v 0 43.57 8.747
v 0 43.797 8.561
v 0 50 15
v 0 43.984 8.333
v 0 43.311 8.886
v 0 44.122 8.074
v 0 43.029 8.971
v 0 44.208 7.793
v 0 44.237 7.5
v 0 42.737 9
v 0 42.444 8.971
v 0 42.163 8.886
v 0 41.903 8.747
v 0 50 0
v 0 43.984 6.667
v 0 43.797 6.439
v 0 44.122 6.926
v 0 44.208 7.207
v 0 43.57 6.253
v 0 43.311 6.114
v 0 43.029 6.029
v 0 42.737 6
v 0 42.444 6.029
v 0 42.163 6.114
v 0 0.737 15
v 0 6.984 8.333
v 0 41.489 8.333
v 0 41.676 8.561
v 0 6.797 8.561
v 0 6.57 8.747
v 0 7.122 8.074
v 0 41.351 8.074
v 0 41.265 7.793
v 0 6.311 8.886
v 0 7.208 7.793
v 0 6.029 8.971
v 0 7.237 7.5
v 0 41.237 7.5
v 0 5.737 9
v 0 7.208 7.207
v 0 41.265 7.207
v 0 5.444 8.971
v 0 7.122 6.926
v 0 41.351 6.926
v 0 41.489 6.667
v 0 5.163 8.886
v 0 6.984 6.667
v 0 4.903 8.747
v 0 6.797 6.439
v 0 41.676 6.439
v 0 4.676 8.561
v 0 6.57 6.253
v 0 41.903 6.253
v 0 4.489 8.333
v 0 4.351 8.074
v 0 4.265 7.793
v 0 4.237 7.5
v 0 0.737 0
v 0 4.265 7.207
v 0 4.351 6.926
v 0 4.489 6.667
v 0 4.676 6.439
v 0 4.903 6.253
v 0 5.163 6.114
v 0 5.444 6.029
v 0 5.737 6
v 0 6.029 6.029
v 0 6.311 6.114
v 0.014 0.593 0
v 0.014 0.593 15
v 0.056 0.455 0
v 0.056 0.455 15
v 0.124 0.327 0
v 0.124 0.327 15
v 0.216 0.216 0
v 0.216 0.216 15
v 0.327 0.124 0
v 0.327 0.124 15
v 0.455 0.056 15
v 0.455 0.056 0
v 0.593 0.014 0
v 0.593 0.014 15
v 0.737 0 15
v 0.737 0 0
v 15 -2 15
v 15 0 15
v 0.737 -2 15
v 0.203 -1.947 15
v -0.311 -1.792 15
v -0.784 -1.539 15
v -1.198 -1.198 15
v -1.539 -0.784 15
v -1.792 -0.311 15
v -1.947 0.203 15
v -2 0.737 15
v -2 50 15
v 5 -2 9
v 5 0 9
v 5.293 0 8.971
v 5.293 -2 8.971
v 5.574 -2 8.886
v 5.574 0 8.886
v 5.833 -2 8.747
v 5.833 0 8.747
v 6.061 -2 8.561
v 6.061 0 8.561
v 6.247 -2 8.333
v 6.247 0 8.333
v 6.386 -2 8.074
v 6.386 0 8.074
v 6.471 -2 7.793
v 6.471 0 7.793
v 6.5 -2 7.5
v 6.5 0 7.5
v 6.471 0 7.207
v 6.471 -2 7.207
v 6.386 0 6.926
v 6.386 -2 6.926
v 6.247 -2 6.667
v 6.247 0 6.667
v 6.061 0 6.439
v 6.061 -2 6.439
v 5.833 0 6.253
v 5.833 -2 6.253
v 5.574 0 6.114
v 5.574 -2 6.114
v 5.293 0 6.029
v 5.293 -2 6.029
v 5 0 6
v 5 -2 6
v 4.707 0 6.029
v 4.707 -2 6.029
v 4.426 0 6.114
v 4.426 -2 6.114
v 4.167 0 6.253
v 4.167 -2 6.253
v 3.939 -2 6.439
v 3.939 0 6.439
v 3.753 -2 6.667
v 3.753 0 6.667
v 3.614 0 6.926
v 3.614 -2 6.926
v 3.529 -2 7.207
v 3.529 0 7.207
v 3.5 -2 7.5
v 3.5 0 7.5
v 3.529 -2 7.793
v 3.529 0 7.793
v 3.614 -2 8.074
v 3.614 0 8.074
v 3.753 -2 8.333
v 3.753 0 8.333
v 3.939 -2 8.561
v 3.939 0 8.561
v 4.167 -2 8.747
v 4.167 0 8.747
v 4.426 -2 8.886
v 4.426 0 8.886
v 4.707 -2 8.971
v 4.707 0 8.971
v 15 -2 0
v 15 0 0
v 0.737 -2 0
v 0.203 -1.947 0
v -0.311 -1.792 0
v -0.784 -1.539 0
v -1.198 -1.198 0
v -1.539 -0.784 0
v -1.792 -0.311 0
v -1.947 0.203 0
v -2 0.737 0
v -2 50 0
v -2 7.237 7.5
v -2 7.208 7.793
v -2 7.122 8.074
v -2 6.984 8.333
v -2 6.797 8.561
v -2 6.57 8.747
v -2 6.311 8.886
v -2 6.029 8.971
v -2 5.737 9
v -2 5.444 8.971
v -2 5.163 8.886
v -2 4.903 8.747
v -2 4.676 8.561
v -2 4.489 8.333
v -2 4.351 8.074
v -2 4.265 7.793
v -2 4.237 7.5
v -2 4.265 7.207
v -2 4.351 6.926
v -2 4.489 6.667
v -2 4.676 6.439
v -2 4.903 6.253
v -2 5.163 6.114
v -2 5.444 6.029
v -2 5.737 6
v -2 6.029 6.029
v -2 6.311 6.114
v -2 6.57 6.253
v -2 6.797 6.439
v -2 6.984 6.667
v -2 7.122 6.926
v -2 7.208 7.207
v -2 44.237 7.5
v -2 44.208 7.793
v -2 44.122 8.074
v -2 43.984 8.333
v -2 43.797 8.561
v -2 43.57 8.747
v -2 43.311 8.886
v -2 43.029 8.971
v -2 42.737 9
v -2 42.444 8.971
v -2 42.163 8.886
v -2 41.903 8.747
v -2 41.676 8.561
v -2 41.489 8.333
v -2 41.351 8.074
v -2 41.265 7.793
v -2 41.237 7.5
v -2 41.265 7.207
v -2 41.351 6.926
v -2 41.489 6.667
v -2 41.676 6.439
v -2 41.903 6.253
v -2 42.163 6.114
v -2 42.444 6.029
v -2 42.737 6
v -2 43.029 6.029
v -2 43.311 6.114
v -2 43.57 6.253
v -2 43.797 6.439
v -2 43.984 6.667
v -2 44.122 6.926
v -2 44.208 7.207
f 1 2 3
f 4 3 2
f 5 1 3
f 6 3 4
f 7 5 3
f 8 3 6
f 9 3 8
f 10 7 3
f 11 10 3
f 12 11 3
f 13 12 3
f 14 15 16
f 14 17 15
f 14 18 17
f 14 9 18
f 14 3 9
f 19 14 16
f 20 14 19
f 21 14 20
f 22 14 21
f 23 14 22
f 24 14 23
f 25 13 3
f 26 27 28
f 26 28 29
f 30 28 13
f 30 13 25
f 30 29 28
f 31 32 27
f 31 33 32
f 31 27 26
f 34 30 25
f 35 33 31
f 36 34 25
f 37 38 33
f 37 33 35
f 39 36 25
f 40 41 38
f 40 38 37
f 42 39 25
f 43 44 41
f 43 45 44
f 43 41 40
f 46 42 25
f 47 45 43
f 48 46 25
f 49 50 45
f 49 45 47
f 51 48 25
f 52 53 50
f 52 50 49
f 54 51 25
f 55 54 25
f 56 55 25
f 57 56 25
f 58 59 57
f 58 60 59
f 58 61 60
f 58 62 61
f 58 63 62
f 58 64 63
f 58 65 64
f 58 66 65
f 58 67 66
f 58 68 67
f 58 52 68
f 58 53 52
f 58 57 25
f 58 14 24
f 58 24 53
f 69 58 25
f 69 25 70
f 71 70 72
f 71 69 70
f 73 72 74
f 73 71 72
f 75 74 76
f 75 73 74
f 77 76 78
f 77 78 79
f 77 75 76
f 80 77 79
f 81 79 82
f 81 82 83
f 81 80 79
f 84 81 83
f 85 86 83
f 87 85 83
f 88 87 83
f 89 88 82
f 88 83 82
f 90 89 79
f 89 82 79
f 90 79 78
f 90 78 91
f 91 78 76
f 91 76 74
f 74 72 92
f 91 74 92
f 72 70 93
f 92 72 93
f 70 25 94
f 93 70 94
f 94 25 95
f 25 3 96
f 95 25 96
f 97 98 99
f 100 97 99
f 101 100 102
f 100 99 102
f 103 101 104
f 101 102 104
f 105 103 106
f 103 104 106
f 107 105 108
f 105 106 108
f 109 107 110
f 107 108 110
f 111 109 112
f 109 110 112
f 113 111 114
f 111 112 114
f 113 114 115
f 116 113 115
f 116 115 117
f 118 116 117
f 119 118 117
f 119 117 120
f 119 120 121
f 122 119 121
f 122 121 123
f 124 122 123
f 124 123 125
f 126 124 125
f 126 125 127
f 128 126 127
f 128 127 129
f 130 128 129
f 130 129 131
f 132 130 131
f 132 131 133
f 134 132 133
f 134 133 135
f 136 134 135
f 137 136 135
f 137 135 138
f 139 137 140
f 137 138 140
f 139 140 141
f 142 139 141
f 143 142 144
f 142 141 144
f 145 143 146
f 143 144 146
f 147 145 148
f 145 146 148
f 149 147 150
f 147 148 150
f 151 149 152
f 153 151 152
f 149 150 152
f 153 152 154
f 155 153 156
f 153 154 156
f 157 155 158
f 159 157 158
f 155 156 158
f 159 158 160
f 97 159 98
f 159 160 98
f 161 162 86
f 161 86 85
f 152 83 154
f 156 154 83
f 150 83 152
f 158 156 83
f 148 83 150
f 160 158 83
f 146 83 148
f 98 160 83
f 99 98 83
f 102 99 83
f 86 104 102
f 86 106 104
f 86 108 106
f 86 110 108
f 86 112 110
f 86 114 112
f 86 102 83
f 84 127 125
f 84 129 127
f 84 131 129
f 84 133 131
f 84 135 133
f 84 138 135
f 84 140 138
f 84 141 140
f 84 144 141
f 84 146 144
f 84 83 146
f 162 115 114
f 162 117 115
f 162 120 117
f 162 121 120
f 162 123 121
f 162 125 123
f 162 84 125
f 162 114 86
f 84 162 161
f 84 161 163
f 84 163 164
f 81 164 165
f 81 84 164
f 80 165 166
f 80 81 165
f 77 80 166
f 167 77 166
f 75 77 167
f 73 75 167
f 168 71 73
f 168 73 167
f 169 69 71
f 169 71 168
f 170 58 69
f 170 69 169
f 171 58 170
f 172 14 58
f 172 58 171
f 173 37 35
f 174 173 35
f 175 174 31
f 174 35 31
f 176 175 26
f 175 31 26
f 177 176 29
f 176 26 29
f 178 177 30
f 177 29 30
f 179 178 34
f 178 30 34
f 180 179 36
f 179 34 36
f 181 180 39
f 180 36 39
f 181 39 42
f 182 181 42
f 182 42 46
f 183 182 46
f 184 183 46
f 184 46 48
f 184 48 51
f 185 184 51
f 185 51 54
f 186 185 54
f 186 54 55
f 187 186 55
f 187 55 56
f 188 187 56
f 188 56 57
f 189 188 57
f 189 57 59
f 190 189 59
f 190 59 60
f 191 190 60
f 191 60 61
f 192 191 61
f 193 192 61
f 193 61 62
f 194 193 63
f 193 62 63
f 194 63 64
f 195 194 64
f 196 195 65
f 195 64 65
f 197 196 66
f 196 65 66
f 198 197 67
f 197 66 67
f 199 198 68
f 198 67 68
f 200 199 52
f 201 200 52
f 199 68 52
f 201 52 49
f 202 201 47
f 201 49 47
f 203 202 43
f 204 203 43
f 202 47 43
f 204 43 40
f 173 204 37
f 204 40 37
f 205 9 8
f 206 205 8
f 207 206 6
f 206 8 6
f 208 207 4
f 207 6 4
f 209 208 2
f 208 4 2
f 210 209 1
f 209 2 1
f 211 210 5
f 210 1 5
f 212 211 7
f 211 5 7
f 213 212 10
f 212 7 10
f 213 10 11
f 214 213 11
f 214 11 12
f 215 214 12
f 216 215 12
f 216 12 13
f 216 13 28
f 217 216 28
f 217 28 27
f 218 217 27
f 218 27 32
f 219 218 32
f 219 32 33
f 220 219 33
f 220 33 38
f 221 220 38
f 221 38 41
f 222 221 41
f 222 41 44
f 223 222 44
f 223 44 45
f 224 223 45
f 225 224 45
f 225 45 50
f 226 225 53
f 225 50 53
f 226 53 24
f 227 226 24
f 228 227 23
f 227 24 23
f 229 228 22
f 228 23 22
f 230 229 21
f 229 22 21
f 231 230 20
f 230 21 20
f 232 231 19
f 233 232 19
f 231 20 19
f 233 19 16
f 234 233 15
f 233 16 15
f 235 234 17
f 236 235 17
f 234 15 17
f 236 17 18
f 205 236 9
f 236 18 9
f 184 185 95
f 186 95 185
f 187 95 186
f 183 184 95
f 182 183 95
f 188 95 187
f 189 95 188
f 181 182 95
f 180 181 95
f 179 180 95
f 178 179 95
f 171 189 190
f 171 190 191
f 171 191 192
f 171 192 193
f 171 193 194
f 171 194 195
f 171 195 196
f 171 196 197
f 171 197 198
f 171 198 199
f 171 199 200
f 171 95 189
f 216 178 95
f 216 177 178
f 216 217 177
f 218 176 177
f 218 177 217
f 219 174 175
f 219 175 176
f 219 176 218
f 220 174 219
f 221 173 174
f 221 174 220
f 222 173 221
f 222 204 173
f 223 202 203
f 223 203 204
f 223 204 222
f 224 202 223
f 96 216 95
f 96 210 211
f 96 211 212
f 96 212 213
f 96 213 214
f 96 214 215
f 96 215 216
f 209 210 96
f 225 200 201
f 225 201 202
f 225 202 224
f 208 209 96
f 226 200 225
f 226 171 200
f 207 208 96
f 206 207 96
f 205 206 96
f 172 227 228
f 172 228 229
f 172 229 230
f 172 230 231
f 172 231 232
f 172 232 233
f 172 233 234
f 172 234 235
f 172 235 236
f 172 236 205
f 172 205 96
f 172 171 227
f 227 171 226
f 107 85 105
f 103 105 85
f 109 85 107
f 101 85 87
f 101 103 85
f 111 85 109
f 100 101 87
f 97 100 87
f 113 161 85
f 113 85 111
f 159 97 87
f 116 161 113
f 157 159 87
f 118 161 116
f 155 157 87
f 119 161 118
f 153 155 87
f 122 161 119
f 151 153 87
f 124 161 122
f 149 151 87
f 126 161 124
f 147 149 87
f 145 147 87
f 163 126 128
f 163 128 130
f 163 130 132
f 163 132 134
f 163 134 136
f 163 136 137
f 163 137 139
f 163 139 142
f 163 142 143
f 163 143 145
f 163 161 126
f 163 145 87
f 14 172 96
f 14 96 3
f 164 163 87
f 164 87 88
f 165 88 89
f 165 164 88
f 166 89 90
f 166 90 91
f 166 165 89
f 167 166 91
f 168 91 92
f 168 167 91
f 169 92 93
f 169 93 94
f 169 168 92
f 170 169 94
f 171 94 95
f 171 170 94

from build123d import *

# Parameters (mm, degrees)
SM_BASE_FLANGE_1_DEPTH = 15
SKETCH_6_R             = 1.5
CUT_EXTRUDE_1_DEPTH    = 55.313902456
SKETCH_7_R             = 1.5
CUT_EXTRUDE_2_DEPTH    = 55.313902456


# Sheet-metal steps are written as plain solids
with BuildPart() as part:
    # Sketch 1 → 基体-法兰1 (new body)
    with BuildSketch(Plane.XY):
        with BuildLine():
            Line((0, 50), (0, 0.7366))
            ThreePointArc((0, 0.7366), (0.215745145, 0.215745145), (0.7366, 0))
            Line((0.7366, 0), (15, 0))
            Line((15, 0), (15, -2))
            Line((15, -2), (0.7366, -2))
            ThreePointArc((0.7366, -2), (-1.198468417, -1.198468417), (-2, 0.7366))
            Line((-2, 0.7366), (-2, 50))
            Line((-2, 50), (0, 50))
        make_face()
    extrude(amount=SM_BASE_FLANGE_1_DEPTH)

    # 草图6 → 切除-拉伸1 (cut, through all)
    with BuildSketch(Plane(origin=(0, 0, 0), x_dir=(1, 0, 0), z_dir=(0, 1, 0))):
        with Locations(Location((5, -7.5, 0), (0, 0, 270))):
            Circle(SKETCH_6_R)
    extrude(amount=-CUT_EXTRUDE_1_DEPTH, mode=Mode.SUBTRACT)

    # 草图7 → 切除-拉伸2 (cut, through all)
    with BuildSketch(Plane(origin=(0, 0, 0), x_dir=(0, 0, -1), z_dir=(1, 0, 0))):
        with Locations(Location((-7.5, 42.7366, 0), (0, 0, 90))):
            Circle(SKETCH_7_R)
        with Locations(Location((-7.5, 5.7366, 0), (0, 0, 90))):
            Circle(SKETCH_7_R)
    extrude(amount=-CUT_EXTRUDE_2_DEPTH, mode=Mode.SUBTRACT)


solid = part.part
